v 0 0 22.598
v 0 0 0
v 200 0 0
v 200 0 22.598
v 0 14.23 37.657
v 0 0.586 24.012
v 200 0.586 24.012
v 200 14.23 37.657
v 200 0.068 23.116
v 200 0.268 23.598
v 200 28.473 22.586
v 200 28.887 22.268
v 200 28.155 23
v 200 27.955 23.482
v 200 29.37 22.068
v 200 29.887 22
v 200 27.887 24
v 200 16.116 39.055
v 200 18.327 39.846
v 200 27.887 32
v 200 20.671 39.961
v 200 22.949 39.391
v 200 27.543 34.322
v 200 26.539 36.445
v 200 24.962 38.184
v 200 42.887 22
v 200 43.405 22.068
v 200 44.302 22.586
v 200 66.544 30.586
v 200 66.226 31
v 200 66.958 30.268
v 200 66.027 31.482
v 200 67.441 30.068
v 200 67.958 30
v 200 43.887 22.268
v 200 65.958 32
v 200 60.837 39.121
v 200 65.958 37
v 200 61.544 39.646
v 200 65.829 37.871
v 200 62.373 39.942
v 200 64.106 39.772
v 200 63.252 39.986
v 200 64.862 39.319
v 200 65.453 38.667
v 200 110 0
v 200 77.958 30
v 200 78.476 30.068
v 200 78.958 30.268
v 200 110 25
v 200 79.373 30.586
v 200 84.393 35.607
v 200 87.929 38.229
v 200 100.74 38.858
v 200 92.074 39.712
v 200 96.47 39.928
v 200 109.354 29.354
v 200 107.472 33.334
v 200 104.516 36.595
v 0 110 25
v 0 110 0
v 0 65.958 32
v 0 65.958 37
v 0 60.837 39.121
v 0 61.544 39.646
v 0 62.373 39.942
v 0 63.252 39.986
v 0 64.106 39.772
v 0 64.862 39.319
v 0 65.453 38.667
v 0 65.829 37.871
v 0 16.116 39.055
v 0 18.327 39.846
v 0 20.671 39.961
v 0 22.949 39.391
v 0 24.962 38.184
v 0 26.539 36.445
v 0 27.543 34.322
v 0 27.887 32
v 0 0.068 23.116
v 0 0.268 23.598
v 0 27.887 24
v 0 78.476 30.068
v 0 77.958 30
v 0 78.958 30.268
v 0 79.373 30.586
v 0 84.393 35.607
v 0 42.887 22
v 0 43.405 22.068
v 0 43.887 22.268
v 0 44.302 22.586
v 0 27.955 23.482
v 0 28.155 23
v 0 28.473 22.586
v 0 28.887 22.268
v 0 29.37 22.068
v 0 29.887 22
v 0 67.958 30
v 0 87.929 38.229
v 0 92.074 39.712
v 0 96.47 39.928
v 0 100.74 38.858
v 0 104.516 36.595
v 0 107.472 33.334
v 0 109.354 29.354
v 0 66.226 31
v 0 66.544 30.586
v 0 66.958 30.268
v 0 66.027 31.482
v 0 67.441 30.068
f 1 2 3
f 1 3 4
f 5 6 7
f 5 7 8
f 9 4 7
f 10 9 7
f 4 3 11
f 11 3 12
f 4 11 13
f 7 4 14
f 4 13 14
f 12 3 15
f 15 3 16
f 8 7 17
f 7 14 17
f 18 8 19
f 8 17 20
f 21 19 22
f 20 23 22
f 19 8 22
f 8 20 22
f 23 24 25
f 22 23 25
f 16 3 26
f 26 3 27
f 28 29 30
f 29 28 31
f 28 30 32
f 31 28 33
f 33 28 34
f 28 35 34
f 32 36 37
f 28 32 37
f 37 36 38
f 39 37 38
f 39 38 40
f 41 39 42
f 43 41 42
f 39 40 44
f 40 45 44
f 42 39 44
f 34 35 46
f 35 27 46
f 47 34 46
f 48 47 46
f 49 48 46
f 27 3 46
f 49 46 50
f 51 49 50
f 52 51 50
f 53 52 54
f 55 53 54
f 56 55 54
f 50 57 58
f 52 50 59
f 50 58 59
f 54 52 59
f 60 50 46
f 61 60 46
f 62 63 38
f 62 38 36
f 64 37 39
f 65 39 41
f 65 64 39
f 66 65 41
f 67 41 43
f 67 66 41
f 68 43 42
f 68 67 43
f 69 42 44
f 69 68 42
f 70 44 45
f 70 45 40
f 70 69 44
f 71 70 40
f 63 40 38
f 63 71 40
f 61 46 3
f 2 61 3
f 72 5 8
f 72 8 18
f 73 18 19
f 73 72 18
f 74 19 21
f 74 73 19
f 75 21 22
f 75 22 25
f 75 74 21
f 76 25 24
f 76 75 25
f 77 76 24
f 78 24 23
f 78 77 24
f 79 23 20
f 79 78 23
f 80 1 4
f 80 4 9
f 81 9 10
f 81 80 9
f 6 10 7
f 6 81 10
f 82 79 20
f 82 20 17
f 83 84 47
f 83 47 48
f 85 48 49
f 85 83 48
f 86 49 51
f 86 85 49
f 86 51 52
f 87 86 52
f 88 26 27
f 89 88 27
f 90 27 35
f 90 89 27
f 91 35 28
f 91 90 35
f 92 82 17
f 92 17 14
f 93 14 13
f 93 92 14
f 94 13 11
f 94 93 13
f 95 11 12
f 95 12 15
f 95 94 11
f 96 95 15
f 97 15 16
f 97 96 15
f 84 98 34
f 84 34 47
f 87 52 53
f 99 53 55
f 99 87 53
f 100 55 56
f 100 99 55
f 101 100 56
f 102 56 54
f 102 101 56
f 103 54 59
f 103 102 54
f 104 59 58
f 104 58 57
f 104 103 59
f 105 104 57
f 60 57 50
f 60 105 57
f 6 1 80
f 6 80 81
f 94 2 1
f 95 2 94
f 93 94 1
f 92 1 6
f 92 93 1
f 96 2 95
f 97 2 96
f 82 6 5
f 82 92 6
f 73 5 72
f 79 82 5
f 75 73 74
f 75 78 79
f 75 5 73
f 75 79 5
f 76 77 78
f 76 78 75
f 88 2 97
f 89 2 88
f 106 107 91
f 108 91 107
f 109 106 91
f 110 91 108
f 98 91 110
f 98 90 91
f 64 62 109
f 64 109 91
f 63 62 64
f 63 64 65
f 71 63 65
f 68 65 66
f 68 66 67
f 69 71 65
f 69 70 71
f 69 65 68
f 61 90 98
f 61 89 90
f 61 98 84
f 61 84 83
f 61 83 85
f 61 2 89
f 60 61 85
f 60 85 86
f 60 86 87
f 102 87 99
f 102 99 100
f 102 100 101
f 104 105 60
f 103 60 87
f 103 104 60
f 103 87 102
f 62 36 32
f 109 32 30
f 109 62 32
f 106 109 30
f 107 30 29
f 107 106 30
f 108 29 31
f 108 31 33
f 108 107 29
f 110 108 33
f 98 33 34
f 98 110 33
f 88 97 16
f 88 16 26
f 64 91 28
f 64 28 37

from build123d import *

# Parameters (mm, degrees)
SALIENTE_EXTRUIR1_DEPTH = 200


with BuildPart() as part:
    # Croquis1 → Saliente-Extruir1 (new body)
    with BuildSketch(Plane(origin=(0, 0, 0), x_dir=(0, 0, -1), z_dir=(1, 0, 0))):
        with BuildLine():
            Line((0, 0), (-22.597979746, 0))
            ThreePointArc((-22.597979746, 0), (-23.363346611, 0.152240935), (-24.012193309, 0.585786438))
            Line((-24.012193309, 0.585786438), (-37.656854249, 14.230447378))
            ThreePointArc((-37.656854249, 14.230447378), (-39.39103626, 22.948769087), (-32, 27.887301628))
            Line((-32, 27.887301628), (-24, 27.887301628))
            ThreePointArc((-24, 27.887301628), (-22.585786438, 28.473088065), (-22, 29.887301628))
            Line((-22, 29.887301628), (-22, 42.887301628))
            ThreePointArc((-22, 42.887301628), (-22.152240935, 43.652668493), (-22.585786438, 44.30151519))
            Line((-22.585786438, 44.30151519), (-39.121320344, 60.837049096))
            ThreePointArc((-39.121320344, 60.837049096), (-39.771638598, 64.106419737), (-37, 65.95836944))
            Line((-37, 65.95836944), (-32, 65.95836944))
            ThreePointArc((-32, 65.95836944), (-30.585786438, 66.544155877), (-30, 67.95836944))
            Line((-30, 67.95836944), (-30, 77.95836944))
            ThreePointArc((-30, 77.95836944), (-30.152240935, 78.723736304), (-30.585786438, 79.372583002))
            Line((-30.585786438, 79.372583002), (-35.606601718, 84.393398282))
            ThreePointArc((-35.606601718, 84.393398282), (-38.858192988, 100.740251485), (-25, 110))
            Line((-25, 110), (0, 110))
            Line((0, 110), (0, 0))
        make_face()
    extrude(amount=SALIENTE_EXTRUIR1_DEPTH)


solid = part.part
